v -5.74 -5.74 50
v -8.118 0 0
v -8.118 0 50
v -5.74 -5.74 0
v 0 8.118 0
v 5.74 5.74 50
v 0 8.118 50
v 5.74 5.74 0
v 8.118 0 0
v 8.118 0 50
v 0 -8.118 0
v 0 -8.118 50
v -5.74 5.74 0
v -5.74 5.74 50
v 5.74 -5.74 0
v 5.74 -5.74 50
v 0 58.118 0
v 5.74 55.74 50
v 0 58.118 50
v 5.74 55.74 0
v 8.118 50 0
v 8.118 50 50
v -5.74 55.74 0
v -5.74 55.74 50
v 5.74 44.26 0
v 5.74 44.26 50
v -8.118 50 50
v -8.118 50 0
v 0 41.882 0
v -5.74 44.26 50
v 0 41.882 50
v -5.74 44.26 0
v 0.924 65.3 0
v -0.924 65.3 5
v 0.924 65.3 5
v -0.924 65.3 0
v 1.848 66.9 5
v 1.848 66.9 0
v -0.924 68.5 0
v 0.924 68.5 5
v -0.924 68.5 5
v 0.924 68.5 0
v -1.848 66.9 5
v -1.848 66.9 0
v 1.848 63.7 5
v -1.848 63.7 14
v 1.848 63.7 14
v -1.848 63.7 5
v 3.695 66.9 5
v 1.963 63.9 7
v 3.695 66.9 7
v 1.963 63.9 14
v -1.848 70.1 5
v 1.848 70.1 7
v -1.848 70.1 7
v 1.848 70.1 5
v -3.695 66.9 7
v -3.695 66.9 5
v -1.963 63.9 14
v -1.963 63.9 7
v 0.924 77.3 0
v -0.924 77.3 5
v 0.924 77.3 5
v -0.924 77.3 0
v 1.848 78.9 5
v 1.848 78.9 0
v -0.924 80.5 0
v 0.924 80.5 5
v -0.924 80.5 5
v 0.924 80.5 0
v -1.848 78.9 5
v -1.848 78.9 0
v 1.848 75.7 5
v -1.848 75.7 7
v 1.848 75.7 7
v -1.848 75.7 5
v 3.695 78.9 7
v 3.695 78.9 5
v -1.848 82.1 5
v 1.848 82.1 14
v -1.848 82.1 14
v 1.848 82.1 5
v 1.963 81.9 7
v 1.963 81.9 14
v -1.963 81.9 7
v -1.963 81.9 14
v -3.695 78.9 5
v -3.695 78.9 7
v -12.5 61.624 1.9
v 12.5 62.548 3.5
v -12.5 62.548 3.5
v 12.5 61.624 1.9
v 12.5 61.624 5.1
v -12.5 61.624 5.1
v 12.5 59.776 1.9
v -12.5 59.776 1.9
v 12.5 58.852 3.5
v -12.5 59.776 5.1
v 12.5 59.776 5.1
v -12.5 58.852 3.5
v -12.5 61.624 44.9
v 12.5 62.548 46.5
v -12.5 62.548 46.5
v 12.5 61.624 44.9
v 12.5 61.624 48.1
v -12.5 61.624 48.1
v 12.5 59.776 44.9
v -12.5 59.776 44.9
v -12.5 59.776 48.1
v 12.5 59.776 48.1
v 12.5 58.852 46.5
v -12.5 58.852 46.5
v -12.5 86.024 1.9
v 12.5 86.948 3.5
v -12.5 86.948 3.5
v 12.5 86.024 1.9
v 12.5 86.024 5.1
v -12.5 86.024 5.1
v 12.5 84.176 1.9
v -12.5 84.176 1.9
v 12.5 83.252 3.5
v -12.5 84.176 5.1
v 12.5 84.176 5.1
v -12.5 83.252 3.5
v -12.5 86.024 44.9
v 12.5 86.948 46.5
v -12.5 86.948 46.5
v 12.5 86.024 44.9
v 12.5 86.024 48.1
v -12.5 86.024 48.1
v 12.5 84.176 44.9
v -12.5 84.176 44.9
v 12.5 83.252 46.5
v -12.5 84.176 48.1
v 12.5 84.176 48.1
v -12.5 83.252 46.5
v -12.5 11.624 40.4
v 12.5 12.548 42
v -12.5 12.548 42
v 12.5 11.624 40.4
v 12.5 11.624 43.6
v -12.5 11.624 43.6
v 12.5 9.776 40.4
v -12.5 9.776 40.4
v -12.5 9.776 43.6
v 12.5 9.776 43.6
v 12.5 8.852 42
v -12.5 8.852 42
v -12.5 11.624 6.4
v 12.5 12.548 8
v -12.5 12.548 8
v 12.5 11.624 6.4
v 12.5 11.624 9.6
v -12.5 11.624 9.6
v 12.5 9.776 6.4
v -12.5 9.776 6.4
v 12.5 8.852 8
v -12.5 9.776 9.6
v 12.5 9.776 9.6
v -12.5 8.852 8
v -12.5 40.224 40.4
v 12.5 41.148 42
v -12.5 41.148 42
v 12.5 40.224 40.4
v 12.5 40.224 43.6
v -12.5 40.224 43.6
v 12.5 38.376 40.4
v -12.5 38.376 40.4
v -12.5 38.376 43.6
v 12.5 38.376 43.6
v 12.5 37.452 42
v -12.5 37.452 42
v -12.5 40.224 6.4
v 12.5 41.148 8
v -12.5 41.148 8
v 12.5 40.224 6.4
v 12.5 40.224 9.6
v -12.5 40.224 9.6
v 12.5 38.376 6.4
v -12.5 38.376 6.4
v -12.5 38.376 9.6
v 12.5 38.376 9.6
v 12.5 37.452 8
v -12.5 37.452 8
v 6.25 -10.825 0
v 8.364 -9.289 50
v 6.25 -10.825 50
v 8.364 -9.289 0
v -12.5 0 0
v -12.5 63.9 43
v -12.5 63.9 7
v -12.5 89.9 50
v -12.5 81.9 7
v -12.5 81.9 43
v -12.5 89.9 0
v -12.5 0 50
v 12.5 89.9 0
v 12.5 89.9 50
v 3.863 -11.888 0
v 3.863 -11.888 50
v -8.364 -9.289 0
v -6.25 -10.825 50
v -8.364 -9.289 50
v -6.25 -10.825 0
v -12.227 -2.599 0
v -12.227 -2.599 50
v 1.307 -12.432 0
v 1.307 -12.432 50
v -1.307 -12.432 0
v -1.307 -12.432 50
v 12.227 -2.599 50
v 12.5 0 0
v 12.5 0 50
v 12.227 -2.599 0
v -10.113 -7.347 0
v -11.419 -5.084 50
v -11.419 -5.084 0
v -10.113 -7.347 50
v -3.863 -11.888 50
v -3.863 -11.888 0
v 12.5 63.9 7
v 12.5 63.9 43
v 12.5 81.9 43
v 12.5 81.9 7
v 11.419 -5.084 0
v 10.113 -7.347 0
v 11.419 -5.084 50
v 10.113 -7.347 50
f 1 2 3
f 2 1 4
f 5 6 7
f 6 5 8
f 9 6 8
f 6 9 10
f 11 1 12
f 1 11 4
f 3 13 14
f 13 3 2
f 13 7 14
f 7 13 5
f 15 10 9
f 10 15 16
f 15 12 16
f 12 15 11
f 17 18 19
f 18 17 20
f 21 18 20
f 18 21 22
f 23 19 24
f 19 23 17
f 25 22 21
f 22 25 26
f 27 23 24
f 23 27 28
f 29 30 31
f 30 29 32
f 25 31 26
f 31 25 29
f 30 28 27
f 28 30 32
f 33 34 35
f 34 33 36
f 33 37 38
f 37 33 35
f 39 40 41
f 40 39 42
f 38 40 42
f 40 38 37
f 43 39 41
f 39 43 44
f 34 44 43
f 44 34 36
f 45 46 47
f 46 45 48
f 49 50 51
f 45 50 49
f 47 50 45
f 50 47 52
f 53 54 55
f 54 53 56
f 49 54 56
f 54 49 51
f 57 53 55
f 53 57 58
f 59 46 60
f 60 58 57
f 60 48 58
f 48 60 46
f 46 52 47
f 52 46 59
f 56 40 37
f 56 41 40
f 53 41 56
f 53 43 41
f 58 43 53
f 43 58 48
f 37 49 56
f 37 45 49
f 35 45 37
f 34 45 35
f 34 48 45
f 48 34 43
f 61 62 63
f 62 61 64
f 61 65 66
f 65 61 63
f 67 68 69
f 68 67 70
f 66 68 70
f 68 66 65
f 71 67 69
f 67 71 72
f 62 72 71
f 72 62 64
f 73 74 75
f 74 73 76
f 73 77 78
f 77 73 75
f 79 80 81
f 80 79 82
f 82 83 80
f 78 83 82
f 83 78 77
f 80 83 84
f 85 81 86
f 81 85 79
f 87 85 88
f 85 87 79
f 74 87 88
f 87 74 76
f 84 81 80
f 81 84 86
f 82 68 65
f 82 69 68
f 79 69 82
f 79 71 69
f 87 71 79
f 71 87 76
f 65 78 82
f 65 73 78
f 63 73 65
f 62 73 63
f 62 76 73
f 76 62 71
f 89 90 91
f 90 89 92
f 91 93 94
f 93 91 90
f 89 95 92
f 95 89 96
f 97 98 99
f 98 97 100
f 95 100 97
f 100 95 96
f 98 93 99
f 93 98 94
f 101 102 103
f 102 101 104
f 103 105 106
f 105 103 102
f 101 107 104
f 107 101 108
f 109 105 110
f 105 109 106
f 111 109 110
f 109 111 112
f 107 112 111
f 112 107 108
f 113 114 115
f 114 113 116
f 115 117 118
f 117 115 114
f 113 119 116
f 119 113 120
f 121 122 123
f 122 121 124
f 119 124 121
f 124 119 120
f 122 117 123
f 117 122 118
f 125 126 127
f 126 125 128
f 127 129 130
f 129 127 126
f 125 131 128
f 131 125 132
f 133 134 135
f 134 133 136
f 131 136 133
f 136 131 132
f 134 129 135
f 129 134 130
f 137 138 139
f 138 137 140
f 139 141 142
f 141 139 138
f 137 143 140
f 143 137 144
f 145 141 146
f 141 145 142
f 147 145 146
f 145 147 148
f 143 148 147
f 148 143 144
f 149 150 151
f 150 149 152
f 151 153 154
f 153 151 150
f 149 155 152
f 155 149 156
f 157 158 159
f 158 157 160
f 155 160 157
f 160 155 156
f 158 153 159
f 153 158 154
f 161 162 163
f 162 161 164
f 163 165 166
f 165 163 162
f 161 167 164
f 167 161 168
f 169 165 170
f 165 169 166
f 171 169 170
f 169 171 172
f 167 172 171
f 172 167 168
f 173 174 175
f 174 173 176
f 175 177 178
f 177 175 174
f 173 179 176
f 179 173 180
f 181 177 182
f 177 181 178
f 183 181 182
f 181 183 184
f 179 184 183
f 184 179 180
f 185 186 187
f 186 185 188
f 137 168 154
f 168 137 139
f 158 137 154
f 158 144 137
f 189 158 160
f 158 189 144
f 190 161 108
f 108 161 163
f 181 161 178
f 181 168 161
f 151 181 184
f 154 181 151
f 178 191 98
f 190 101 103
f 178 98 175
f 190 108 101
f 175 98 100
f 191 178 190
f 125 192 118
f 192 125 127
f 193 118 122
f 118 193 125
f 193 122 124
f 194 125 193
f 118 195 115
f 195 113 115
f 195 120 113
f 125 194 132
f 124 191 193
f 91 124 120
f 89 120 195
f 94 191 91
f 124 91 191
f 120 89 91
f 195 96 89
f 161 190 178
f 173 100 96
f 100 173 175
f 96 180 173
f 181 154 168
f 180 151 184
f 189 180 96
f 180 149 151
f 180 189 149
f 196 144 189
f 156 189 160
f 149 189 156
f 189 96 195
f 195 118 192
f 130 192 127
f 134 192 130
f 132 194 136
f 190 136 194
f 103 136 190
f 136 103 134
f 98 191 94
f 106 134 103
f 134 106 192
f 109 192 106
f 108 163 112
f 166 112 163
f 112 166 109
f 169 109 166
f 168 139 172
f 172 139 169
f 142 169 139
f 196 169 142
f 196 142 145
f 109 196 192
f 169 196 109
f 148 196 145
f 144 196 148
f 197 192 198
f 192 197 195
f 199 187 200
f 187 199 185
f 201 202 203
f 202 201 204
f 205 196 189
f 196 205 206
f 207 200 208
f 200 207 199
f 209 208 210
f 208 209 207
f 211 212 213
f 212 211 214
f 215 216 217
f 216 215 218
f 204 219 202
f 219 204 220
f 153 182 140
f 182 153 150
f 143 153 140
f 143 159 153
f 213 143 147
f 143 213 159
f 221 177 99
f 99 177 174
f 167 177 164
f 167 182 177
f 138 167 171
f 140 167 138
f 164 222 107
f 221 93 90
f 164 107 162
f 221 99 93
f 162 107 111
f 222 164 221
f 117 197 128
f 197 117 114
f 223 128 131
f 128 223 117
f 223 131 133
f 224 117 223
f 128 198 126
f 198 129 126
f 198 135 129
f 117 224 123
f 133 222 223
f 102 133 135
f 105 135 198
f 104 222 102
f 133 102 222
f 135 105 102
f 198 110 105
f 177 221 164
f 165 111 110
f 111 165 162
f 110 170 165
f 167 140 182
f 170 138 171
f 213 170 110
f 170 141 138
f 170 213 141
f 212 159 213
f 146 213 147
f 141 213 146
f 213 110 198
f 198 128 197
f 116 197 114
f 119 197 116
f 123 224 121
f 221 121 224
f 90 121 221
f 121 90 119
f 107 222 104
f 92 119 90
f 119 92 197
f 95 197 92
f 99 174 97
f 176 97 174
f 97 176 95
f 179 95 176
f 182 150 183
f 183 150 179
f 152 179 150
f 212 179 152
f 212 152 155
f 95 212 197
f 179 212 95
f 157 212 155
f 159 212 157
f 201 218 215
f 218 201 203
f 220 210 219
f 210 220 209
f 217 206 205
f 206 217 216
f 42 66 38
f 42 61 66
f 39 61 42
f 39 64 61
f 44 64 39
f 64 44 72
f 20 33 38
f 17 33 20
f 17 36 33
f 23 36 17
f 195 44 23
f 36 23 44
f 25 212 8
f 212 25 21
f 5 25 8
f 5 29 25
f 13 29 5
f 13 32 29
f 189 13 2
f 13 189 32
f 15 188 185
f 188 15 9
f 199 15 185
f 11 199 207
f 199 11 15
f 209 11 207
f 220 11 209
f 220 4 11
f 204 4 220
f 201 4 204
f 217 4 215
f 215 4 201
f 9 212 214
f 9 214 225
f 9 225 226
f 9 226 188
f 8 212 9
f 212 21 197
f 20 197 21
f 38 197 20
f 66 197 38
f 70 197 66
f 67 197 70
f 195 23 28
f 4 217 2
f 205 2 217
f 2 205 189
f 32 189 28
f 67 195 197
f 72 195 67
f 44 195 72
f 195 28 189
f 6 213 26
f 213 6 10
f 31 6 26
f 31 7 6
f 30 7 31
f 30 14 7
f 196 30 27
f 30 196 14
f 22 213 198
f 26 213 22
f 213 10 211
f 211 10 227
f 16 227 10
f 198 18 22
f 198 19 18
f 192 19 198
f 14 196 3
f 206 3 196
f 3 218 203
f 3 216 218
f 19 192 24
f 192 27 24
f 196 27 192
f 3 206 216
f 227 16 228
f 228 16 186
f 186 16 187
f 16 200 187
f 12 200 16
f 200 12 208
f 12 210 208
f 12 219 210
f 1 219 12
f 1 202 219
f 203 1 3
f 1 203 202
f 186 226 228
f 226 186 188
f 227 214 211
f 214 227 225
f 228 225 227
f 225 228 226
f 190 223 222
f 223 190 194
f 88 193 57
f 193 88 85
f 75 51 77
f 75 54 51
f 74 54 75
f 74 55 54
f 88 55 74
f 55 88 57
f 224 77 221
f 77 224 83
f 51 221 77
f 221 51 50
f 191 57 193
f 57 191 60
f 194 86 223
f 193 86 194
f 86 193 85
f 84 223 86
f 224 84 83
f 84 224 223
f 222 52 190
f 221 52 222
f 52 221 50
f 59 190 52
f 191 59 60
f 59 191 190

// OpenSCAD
// file: vars.scad
// Variables used throughout design.
// Yes, these could use some commenting.
// (c) 2014, Christopher "ScribbleJ" Jansen
huge=500;

printer_w = 400;
printer_l = 400;
printer_h = 400;

bearing_w = 7;
bearing_d = 22;
bearing_r = bearing_d/2;
bearing_hole_d = 8;
bearing_hole_r = bearing_hole_d/2;


misc_bolt_d = 3.2;
misc_bolt_r = misc_bolt_d/2;
misc_nut_r  = misc_bolt_d;
misc_bolt_pitch = 0.5;
misc_bolthead_d = misc_bolt_d*2;
misc_bolthead_r = misc_bolthead_d/2;

retainer_shell_thick = 0.5;
retainer_shell_sep   = 0.25;
//retainer_lip_thick   = 1;
retainer_lip_thick   = 2;
retainer_inner_width = 1;

belt_w    = 6;
belt_thick= 2;
belt_sep  = retainer_lip_thick*2 + 2;

calc_retainer_h  = retainer_lip_thick*2 + belt_w;
calc_retainer_ir = bearing_r + retainer_shell_thick*2 + retainer_shell_sep;
calc_retainer_or = calc_retainer_ir + belt_thick;
calc_retainer_b_off = retainer_lip_thick - (bearing_w-belt_w)/2;

tslot_w = 20;
tslot_bolt_d = 5;
tslot_bolt_r = tslot_bolt_d/2;
tslot_bolt_l = 4;
tslot_bolthead_d = 10;
tslot_bolthead_r = tslot_bolthead_d/2;


corner_thick = 5;
corner_length = tslot_w*3;

rod_d=8;
rod_r=rod_d/2;

bushing_d=15;
bushing_r=bushing_d/2;
bushing_l=10;
bushing_flange_r = bushing_r+3;
bushing_flange_w = 1;
bushing_material_thick = 5;

x_rod_sep = 50;
x_carriage_l = 50;
x_mount_sep_x = x_carriage_l - misc_bolthead_r*2*2 - misc_bolt_r*2;
x_mount_offset = bushing_r + misc_bolt_r * 2;
belt_above_x = bushing_r+misc_nut_r*2;
belt_clamp_w = 7;
x_rod_past_bearing = 20;

//belt_above_y = belt_above_x + x_rod_sep/2;
//y_above_x = belt_above_x-belt_above_y;
belt_above_y = 45;
y_above_x = belt_above_x-belt_above_y;




bearing_mount_base = corner_thick;
bearing_mount_extra = 2;
belt_above_bearing_mount = bearing_mount_base + bearing_mount_extra + retainer_lip_thick;
bearing_mount_support_tweak = 30;

y_bearing_offset = bushing_r+bushing_material_thick-calc_retainer_ir;

y_bearing_sep_y = calc_retainer_ir*2+belt_thick;
y_bearing_sep_z = belt_w+belt_sep;
bearing_bolt_r  = 4;
bearing_bolt_pitch = 1.25;
bearing_bolt_holder_thick = 4;
y_carriage_from_tslot = 2;

y_carriage_len = 50;

motor_w = 42.3;
motor_h = motor_w;
motor_bolt_sep = 31.0;
motor_bolt_r   = 1.5;
motor_pulley_d = 10;
motor_pulley_r = motor_pulley_d/2;
motor_pulley_h = 5.3;
motor_flange_d = 23;
motor_flange_r = motor_flange_d/2;
motor_corner_extra_hole_pos = tslot_bolt_r+3;

calc_corner_from_y_rod = x_rod_past_bearing+corner_thick+y_carriage_from_tslot+tslot_w;
calc_corner_above_x = belt_above_x - belt_above_bearing_mount + bearing_mount_base;

calc_motor1_above_x  = belt_above_x - motor_pulley_h;
calc_motor2_above_x  = belt_above_x - motor_pulley_h + belt_w + belt_sep;
calc_motor_from_y_rod = -bushing_r - bushing_material_thick + bearing_bolt_holder_thick + bearing_bolt_r + calc_retainer_or + motor_pulley_r;

motor_bracket_thick = 12;
motor_bracket_wide = (motor_w - motor_flange_d) / 2;
motor_bracket_len  = motor_w;
motor_bolt_offset  = (motor_w - motor_bolt_sep) / 2;

z_rod_sep = 150;
z_motor_off = motor_h - tslot_w - corner_thick;

laser_mat_thick = 4.75;
laser_mat_margin = laser_mat_thick;
bed_mount_sep   = 209;
bed_from_z      = 60;
bed_box_r       = 25;
bed_box_h       = 50;
z_ends_sep = printer_l - tslot_w*2 - corner_thick*2 - motor_w;
platform_l      =  laser_mat_margin*2 + laser_mat_thick*2 + bed_box_r*2 + z_ends_sep;
platform_w      = bed_mount_sep + misc_bolt_r*2 + laser_mat_margin*2;
z_leadscrew_passthrough_r = 12/2;
leadscrew_bolt_offset = 22/2;
leadscrew_bolt_r = 3.2/2;
laser_bushing_fudge = 0.1;


lm8uu_d=15;
lm8uu_r=lm8uu_d/2;
lm8uu_bolt_r=5/2;
lm8uu_nut_r=10/2;

arduino_width=60;
// file: common.scad
// Common functions used in various places throughout.
// (c) 2014, Christopher "ScribbleJ" Jansen
include <vars.scad>

// Reduce radius of holes intended to hold bolts by threads.
// 0.86603 * p = nominal depth of threads.  1/3-1/2 of that is about right.
function smallhole(r,p) = r - ((p*0.86603)/3);

// Polyhole derived from Nophead's Polyhole work: http://hydraraptor.blogspot.com/2011/02/polyholes.html
module polyhole(r,h,v=6,a=0)
{
  rotate([0,0,a]) cylinder( h = h, r = r  / cos( 180 / v ), $fn = v );
}
// 2D version of Polyhole
module polycircle(r,v=6,a=0)
{
  rotate([0,0,a]) circle(r = r  / cos( 180 / v ), $fn = v );
}
// Cutout for bolthole
module bolt(bolt_r = misc_bolt_r,bolthead_r = misc_bolthead_r,bolt_len = huge,v=6,a=0)
{
  translate([0,0,-bolt_len]) polyhole(r=bolt_r,h=bolt_len+1,v=v,a=a);
  polyhole(r=bolthead_r,h=huge,v=v,a=a);
}
// 2D ring
module ring(inner=5,outer=10,v=32)
{
  difference()
  {
    circle(r=outer);
    polycircle(r=inner,v=v);
  }
} 
// 2D Rounded square
module roundsquare(dim=[50,50],r=5)
{
  translate([0,r]) square([dim[0], dim[1] - r*2]);
  translate([r,0]) square([dim[0] - r*2, dim[1]]);
  for(x=[r,dim[0]-r])
  for(y=[r,dim[1]-r])
    translate([x,y]) circle(r=r);
}
// Lasercutting Tabs
module maketabs(l=100,w=5,num=10)
{
  tablength=l/(num * 2);
  for(x=[tablength/2:tablength*2:l])
    translate([x,0]) square([tablength,w]);
}
// Support for printing bearing mount
module support(l=bearing_mount_base+bearing_mount_extra+y_bearing_sep_z+calc_retainer_b_off,w=bearing_hole_d * tan(180/6) *2,extra=0,extra_l=0)
{
  translate([-w/2,0,-l]) 
  {
    difference()
    {
      rotate([45,0,0]) cube([w,huge/2,huge/2]);
      translate([-huge/2,0,0]) cube([huge,huge,huge]);
      translate([-huge/2,-huge/2,l]) cube([huge,huge,huge]);
    }
    translate([0,-extra,-extra_l/2]) cube([w,extra,extra_l]);
  }

}
// main file
// X-Carriage
// Print 1.
// (c) 2014, Christopher "ScribbleJ" Jansen
include <common.scad>

x_carriage();

module display_x_carriage()
{
  x_carriage();
}

module x_carriage()
{
  x_len = x_rod_sep + belt_above_x + belt_w*2 + belt_sep + misc_nut_r*2.5;
  difference()
  {
    // Shape
    linear_extrude(height=x_carriage_l)
    {
      circle(r=bushing_r+bushing_material_thick);
      //translate([0,x_len]) circle(r=bushing_r+bushing_material_thick);
      translate([-(bushing_r+bushing_material_thick), 0]) square([2*(bushing_r+bushing_material_thick),x_len]);
    }

    // Bushing/Rod Channels
    for(x=[0,x_rod_sep])
      translate([0,x,-1]) polyhole(r=bushing_r,h=x_carriage_l+2,v=8);

    // Belt Passthrough
    translate([-huge/2,x_rod_sep + belt_above_x,belt_clamp_w]) cube([huge,belt_w*2+belt_sep,x_carriage_l-belt_clamp_w*2]);

    // Holes for belt tensioner
    for(y=[x_rod_sep+belt_above_x+belt_w/2,x_rod_sep+belt_above_x+belt_w+belt_sep+belt_w/2])
    {
      translate([0,y,-1]) polyhole(r=misc_bolt_r,h=belt_clamp_w+2);
      translate([0,y,belt_clamp_w - 2]) polyhole(r=misc_nut_r,h=belt_clamp_w+2,v=6);
    }

    // Holes for belt clamp bolts
    for(y=[x_rod_sep + belt_above_x - misc_nut_r,x_rod_sep + belt_above_x + belt_w*2 + belt_sep + misc_nut_r])
    for(z=[belt_clamp_w/2,x_carriage_l-belt_clamp_w/2])
      translate([-huge/2,y,z]) rotate([0,90,0]) polyhole(r=misc_bolt_r,h=huge,v=6,a=360/12);

    // Hole for bushing cap
    //translate([0,x_rod_sep/2,-1]) polyhole(r=smallhole(misc_bolt_r,misc_bolt_pitch),h=huge);

    // Mounting holes for extruder
    for(y=[x_mount_offset,x_rod_sep - x_mount_offset])
    for(z=[x_mount_sep_x/2,-x_mount_sep_x/2])
      translate([-huge/2,y,x_carriage_l/2+z]) rotate([0,90,0]) polyhole(r=misc_bolt_r,h=huge,v=6,a=360/12);
  }
}
